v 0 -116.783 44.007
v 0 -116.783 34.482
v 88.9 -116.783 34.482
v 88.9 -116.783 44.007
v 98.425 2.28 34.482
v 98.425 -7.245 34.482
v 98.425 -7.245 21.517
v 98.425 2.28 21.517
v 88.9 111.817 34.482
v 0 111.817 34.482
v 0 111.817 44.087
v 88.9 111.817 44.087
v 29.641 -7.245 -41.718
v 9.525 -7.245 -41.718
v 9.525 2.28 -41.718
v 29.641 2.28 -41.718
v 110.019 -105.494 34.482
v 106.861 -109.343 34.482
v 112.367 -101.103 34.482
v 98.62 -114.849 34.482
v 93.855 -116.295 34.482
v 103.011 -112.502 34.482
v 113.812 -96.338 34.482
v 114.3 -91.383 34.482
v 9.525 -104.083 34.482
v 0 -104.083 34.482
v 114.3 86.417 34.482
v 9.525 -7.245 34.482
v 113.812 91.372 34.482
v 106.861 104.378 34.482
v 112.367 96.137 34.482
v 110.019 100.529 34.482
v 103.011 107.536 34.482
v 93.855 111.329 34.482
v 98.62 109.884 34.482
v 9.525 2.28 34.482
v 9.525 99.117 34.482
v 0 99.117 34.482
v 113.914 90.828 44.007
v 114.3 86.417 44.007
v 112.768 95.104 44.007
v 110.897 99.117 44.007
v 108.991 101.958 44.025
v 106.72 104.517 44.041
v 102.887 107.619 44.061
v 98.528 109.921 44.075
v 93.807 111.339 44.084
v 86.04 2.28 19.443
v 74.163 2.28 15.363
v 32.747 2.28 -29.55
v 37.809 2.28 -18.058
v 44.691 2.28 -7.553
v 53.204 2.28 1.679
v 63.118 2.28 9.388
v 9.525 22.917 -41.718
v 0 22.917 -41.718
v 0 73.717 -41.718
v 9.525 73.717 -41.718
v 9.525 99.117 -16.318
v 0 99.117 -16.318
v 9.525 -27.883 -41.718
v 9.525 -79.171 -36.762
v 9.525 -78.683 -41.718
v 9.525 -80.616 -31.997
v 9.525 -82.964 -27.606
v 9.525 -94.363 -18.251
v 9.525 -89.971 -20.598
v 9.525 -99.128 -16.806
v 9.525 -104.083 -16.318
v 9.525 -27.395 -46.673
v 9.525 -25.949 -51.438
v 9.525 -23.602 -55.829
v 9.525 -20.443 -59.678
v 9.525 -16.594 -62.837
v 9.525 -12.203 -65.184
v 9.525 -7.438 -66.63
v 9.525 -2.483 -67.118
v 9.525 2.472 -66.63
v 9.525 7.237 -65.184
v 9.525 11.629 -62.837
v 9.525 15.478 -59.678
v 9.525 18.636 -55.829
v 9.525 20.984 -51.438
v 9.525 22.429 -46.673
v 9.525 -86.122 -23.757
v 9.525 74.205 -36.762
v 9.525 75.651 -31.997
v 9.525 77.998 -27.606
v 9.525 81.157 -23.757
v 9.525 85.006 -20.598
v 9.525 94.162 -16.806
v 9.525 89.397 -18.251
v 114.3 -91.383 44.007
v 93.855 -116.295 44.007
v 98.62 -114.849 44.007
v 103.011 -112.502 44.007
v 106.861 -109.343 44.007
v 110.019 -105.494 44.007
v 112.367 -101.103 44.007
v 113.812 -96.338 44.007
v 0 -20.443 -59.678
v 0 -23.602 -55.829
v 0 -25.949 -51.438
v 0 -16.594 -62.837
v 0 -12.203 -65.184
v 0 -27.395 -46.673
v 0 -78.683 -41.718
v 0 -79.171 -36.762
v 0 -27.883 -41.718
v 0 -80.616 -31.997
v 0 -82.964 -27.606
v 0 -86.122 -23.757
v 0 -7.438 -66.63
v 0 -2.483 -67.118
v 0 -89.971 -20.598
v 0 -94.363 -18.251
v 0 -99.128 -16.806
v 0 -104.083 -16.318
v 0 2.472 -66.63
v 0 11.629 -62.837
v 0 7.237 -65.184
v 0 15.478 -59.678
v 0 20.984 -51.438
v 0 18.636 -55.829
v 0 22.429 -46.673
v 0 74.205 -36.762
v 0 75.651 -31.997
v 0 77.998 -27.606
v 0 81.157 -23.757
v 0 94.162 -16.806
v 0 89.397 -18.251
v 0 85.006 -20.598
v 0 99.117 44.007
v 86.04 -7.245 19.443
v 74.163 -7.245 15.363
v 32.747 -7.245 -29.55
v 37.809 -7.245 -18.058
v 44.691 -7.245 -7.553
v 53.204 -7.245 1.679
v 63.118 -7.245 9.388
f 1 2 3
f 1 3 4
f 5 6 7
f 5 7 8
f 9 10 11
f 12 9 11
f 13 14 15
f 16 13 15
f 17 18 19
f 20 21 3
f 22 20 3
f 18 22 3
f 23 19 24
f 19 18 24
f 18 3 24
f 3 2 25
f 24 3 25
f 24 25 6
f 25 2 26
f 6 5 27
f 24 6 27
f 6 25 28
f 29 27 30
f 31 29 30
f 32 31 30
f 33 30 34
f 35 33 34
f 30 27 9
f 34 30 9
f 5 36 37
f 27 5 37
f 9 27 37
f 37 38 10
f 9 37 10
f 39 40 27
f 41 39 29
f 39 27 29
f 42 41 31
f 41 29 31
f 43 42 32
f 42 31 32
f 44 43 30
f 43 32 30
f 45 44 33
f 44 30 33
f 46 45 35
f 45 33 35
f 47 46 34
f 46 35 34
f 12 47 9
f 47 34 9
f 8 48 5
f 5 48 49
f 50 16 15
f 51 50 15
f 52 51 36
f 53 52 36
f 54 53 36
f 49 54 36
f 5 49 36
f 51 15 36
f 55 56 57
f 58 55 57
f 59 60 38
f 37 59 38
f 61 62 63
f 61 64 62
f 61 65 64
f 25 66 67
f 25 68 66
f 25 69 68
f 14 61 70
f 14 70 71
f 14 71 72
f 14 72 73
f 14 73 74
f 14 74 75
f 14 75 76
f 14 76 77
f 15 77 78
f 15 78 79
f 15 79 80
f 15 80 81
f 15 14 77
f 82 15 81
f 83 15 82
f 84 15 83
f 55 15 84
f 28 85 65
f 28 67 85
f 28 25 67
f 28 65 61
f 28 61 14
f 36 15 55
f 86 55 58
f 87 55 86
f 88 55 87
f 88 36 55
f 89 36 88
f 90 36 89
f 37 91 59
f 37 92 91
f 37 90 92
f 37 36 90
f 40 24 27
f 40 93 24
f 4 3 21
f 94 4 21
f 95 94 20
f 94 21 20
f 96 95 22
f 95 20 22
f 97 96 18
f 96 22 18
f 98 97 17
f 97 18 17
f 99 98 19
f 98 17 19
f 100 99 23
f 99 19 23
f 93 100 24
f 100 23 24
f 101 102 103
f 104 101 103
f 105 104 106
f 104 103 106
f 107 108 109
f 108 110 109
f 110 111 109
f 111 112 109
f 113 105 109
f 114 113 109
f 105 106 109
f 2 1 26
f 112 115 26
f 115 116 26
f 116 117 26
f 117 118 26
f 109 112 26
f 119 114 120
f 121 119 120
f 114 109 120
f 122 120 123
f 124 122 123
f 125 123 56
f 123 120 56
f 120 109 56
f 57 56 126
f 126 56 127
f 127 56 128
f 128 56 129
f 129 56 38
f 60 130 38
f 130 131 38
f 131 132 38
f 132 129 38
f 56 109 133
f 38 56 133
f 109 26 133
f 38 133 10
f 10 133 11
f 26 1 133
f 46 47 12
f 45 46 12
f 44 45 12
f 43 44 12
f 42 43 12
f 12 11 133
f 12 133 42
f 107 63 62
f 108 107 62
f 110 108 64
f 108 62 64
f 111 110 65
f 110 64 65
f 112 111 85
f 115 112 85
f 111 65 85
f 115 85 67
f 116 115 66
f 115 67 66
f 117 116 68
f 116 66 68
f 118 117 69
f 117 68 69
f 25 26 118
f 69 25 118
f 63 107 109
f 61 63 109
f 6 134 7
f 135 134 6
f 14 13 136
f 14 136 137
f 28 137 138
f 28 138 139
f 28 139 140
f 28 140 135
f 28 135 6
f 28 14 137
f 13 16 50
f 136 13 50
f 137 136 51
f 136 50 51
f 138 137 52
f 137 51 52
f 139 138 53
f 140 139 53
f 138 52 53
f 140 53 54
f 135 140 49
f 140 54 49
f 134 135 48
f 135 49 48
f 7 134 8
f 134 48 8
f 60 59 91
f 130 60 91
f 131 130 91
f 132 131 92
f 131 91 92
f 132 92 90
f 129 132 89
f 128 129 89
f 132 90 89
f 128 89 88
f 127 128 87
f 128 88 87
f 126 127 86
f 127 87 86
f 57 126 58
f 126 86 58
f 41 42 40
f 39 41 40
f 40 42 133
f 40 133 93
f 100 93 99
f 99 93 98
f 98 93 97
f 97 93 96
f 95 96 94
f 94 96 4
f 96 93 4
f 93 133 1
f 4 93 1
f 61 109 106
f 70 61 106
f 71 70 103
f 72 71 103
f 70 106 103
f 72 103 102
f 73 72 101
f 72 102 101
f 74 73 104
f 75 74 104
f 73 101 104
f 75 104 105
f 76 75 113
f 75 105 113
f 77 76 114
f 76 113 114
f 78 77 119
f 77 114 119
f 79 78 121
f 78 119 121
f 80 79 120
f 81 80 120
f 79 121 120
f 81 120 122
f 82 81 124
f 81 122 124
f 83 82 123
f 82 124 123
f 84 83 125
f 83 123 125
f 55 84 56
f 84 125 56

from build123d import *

# Parameters (mm, degrees)
F0_W      = 203.2
F0_H      = 9.525
F0_W_2    = 12.7
F1_DEPTH  = 114.3
F2_DEPTH  = 9.525
F3_W      = 9.525
F3_H      = 76.2
F4_DEPTH  = 88.9
F6_DEPTH  = 119.0635
F8_DEPTH  = 9.526
F10_DEPTH = 9.6059256377


with BuildPart() as f1:
    # F0 (on Right) → F1 (new body)
    with BuildSketch(Plane.YZ):
        with Locations((-2.4829334736, 39.2448874779)):
            Rectangle(F0_W, F0_H)
        Polygon((99.1170665264, 44.0073874779), (99.1170665264, 34.4823874779), (111.8170665264, 34.4823874779), (111.8170665264, 44.0873131156), align=None)
        with Locations((-110.4329334736, 39.2448874779)):
            Rectangle(F0_W_2, F0_H)
    extrude(amount=F1_DEPTH)

    # F0 (on Right) → F2 (join)
    with BuildSketch(Plane.YZ):
        Polygon((99.1170665264, 34.4823874779), (-104.0829334736, 34.4823874779), (-104.0829334736, -41.7176125221), (-27.8829334736, -41.7176125221), (22.9170665264, -41.7176125221), (99.1170665264, -41.7176125221), align=None)
        with BuildLine():
            Line((22.9170665264, -41.7176125221), (-27.8829334736, -41.7176125221))
            ThreePointArc((-27.8829334736, -41.7176125221), (-2.4829334736, -67.1176125221), (22.9170665264, -41.7176125221))
        make_face()
    extrude(amount=F2_DEPTH)

    # F3 (on face) → F4 (join)
    with BuildSketch(Plane.YZ.offset(9.525)):
        with Locations((-2.4829334736, -3.6176125221)):
            Rectangle(F3_W, F3_H)
    extrude(amount=F4_DEPTH)

    # F5 (on face) → F6 (cut, through all)
    with BuildSketch(Plane(origin=(0, 2.2795665264, 0), x_dir=(-1, 0, 0), z_dir=(0, 1, 0))):
        with BuildLine():
            ThreePointArc((-29.6407867546, -41.7176125221), (-53.2038437376, 1.6792308985), (-98.425, 21.5173431966))
            Line((-98.425, 21.5173431966), (-98.425, -41.7176125221))
            Line((-98.425, -41.7176125221), (-29.6407867546, -41.7176125221))
        make_face()
    extrude(amount=-F6_DEPTH, mode=Mode.SUBTRACT)

    # F7 (on face) → F8 (cut, through all)
    with BuildSketch(Plane.YZ.offset(9.525)):
        with BuildLine():
            Line((-104.0829334736, -41.7176125221), (-78.6829334736, -41.7176125221))
            ThreePointArc((-78.6829334736, -41.7176125221), (-86.1224212314, -23.75710028), (-104.0829334736, -16.3176125221))
            Line((-104.0829334736, -16.3176125221), (-104.0829334736, -41.7176125221))
        make_face()
        with BuildLine():
            Line((99.1170665264, -41.7176125221), (99.1170665264, -16.3176125221))
            ThreePointArc((99.1170665264, -16.3176125221), (81.1565542843, -23.75710028), (73.7170665264, -41.7176125221))
            Line((73.7170665264, -41.7176125221), (99.1170665264, -41.7176125221))
        make_face()
    extrude(amount=-F8_DEPTH, mode=Mode.SUBTRACT)

    # F9 (on face) → F10 (cut, through all)
    with BuildSketch(Plane(origin=(0, 0, 34.4823874779), x_dir=(1, 0, 0), z_dir=(0, 0, -1))):
        with BuildLine():
            ThreePointArc((88.9, 116.7829334736), (106.8605122421, 109.3434457157), (114.3, 91.3829334736))
            Line((114.3, 91.3829334736), (114.3, 116.7829334736))
            Line((114.3, 116.7829334736), (89.5812958479, 116.7829334736))
            Line((89.5812958479, 116.7829334736), (88.9, 116.7829334736))
        make_face()
        with BuildLine():
            Line((114.3, -111.8170665264), (114.3, -86.4170665264))
            ThreePointArc((114.3, -86.4170665264), (106.8605122421, -104.3775787686), (88.9, -111.8170665264))
            Line((88.9, -111.8170665264), (95.8859026432, -111.8170665264))
            Line((95.8859026432, -111.8170665264), (114.3, -111.8170665264))
        make_face()
    extrude(amount=-F10_DEPTH, mode=Mode.SUBTRACT)


solid = f1.part
